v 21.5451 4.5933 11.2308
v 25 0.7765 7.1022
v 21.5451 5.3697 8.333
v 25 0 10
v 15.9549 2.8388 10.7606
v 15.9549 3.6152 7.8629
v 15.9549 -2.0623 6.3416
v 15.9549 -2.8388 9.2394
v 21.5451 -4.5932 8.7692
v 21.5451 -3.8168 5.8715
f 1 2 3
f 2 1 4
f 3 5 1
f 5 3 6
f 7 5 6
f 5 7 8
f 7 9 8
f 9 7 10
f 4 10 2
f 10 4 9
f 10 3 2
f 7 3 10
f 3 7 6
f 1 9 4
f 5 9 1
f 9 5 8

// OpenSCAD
$fn=5;
translate([20,0.77645725,7.1022224])
{
	rotate(14.999978,[1,0,0])
	{
		cylinder(h=3,d=10);
	}
}
